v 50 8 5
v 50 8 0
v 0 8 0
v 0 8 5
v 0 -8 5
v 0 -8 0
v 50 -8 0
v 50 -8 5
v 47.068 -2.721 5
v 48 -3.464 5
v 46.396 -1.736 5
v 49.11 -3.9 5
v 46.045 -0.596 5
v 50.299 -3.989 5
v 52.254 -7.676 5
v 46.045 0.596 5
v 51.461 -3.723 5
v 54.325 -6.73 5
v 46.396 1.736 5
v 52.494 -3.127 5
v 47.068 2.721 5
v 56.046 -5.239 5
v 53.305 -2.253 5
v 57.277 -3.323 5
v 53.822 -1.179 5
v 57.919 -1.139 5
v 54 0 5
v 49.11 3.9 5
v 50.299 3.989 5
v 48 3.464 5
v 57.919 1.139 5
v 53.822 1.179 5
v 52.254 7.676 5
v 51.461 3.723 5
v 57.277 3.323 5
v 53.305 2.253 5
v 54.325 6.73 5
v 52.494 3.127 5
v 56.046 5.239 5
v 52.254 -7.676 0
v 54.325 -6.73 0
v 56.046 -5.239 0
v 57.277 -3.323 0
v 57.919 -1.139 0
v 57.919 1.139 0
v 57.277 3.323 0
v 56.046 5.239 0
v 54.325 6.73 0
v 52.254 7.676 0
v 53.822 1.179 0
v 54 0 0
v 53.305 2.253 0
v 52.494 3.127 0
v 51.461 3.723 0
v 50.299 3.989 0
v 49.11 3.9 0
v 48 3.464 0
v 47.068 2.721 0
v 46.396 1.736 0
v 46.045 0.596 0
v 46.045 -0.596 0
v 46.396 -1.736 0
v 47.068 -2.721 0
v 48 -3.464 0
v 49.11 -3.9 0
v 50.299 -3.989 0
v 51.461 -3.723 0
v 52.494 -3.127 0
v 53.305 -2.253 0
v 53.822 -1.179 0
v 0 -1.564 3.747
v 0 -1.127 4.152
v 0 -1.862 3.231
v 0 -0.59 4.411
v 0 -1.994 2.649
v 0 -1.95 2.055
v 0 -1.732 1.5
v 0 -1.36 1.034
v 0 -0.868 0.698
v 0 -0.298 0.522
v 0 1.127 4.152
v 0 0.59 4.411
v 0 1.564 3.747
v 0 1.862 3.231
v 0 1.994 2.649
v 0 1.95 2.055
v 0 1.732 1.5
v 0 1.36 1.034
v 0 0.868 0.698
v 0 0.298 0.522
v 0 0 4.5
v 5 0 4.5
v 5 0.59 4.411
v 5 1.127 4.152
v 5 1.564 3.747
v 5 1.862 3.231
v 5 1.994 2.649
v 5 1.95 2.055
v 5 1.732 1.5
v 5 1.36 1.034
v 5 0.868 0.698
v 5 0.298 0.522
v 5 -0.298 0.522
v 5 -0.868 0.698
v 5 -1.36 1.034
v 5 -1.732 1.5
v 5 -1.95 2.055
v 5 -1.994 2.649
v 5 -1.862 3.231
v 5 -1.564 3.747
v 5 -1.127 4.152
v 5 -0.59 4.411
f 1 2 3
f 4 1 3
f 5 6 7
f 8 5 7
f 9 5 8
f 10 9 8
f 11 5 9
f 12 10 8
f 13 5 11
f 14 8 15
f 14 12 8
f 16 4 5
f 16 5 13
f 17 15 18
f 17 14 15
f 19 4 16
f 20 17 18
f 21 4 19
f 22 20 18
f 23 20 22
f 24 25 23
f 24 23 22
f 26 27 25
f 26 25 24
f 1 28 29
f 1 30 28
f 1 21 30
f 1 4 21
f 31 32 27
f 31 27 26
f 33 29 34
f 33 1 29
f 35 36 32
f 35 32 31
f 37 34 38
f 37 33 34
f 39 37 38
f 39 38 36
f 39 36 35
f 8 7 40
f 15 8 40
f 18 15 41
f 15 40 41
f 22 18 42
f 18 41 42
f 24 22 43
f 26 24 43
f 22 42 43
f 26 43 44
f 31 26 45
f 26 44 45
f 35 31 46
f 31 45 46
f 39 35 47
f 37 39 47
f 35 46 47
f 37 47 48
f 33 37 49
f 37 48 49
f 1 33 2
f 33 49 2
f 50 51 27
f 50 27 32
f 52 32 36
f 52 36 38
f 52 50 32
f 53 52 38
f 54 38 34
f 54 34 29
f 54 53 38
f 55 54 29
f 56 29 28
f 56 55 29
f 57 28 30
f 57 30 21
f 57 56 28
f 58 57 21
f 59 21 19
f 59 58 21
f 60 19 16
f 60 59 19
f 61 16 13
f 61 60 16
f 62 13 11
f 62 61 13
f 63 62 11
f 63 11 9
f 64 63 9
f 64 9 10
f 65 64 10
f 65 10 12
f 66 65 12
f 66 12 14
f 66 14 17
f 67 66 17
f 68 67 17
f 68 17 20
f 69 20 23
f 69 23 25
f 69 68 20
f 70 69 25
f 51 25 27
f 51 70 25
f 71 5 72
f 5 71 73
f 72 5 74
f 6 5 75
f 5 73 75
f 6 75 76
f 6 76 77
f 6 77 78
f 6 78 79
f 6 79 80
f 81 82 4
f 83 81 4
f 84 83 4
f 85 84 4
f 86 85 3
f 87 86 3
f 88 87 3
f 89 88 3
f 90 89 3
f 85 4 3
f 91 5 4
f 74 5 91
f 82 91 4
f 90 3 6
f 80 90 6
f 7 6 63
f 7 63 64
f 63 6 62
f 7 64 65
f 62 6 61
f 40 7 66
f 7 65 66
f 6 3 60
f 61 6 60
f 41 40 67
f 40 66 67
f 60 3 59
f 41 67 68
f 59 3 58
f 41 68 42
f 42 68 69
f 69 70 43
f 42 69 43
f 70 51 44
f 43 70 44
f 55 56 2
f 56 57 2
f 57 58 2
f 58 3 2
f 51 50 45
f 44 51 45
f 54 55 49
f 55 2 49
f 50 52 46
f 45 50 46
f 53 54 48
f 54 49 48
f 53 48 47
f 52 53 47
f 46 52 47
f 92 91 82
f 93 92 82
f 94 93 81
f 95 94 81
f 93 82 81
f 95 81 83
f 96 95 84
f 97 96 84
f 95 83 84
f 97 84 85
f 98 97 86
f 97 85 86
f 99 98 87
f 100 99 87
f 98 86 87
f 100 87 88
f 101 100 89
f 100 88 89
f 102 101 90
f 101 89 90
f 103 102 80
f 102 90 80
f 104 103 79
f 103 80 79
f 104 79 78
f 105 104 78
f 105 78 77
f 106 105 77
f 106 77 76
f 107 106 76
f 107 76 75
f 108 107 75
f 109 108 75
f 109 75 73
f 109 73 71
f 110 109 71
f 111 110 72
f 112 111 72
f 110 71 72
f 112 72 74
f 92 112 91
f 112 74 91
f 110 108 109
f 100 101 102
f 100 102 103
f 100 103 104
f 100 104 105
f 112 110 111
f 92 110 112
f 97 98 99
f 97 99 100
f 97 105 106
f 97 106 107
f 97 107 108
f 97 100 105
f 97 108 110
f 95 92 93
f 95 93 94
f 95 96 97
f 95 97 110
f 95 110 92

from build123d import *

# Parameters (mm, degrees)
SKETCH1_R           = 4
BOSS_EXTRUDE1_DEPTH = 5
SKETCH2_W           = 5
SKETCH2_H           = 16
CUT_EXTRUDE1_DEPTH  = 59.762232769
SKETCH3_R           = 2
CUT_EXTRUDE3_DEPTH  = 5


with BuildPart() as part:
    # Sketch1 → Boss-Extrude1 (new body)
    with BuildSketch(Plane.XY):
        with BuildLine():
            Line((-50, -8), (50, -8))
            ThreePointArc((50, -8), (58, 0), (50, 8))
            Line((50, 8), (-50, 8))
            ThreePointArc((-50, 8), (-58, 0), (-50, -8))
        make_face()
        with Locations((-50, 0)):
            Circle(SKETCH1_R, mode=Mode.SUBTRACT)
        with Locations((50, 0)):
            Circle(SKETCH1_R, mode=Mode.SUBTRACT)
    extrude(amount=BOSS_EXTRUDE1_DEPTH)

    # Sketch2 → Cut-Extrude1 (cut, through all)
    with BuildSketch(Plane(origin=(0, 0, 0), x_dir=(0, 0, -1), z_dir=(1, 0, 0))):
        with Locations((-2.5, 0)):
            Rectangle(SKETCH2_W, SKETCH2_H)
    extrude(amount=-CUT_EXTRUDE1_DEPTH, mode=Mode.SUBTRACT)

    # Sketch3 → Cut-Extrude3 (cut)
    with BuildSketch(Plane.ZY):
        with Locations((2.5, 0)):
            Circle(SKETCH3_R)
    extrude(amount=-CUT_EXTRUDE3_DEPTH, mode=Mode.SUBTRACT)


solid = part.part
